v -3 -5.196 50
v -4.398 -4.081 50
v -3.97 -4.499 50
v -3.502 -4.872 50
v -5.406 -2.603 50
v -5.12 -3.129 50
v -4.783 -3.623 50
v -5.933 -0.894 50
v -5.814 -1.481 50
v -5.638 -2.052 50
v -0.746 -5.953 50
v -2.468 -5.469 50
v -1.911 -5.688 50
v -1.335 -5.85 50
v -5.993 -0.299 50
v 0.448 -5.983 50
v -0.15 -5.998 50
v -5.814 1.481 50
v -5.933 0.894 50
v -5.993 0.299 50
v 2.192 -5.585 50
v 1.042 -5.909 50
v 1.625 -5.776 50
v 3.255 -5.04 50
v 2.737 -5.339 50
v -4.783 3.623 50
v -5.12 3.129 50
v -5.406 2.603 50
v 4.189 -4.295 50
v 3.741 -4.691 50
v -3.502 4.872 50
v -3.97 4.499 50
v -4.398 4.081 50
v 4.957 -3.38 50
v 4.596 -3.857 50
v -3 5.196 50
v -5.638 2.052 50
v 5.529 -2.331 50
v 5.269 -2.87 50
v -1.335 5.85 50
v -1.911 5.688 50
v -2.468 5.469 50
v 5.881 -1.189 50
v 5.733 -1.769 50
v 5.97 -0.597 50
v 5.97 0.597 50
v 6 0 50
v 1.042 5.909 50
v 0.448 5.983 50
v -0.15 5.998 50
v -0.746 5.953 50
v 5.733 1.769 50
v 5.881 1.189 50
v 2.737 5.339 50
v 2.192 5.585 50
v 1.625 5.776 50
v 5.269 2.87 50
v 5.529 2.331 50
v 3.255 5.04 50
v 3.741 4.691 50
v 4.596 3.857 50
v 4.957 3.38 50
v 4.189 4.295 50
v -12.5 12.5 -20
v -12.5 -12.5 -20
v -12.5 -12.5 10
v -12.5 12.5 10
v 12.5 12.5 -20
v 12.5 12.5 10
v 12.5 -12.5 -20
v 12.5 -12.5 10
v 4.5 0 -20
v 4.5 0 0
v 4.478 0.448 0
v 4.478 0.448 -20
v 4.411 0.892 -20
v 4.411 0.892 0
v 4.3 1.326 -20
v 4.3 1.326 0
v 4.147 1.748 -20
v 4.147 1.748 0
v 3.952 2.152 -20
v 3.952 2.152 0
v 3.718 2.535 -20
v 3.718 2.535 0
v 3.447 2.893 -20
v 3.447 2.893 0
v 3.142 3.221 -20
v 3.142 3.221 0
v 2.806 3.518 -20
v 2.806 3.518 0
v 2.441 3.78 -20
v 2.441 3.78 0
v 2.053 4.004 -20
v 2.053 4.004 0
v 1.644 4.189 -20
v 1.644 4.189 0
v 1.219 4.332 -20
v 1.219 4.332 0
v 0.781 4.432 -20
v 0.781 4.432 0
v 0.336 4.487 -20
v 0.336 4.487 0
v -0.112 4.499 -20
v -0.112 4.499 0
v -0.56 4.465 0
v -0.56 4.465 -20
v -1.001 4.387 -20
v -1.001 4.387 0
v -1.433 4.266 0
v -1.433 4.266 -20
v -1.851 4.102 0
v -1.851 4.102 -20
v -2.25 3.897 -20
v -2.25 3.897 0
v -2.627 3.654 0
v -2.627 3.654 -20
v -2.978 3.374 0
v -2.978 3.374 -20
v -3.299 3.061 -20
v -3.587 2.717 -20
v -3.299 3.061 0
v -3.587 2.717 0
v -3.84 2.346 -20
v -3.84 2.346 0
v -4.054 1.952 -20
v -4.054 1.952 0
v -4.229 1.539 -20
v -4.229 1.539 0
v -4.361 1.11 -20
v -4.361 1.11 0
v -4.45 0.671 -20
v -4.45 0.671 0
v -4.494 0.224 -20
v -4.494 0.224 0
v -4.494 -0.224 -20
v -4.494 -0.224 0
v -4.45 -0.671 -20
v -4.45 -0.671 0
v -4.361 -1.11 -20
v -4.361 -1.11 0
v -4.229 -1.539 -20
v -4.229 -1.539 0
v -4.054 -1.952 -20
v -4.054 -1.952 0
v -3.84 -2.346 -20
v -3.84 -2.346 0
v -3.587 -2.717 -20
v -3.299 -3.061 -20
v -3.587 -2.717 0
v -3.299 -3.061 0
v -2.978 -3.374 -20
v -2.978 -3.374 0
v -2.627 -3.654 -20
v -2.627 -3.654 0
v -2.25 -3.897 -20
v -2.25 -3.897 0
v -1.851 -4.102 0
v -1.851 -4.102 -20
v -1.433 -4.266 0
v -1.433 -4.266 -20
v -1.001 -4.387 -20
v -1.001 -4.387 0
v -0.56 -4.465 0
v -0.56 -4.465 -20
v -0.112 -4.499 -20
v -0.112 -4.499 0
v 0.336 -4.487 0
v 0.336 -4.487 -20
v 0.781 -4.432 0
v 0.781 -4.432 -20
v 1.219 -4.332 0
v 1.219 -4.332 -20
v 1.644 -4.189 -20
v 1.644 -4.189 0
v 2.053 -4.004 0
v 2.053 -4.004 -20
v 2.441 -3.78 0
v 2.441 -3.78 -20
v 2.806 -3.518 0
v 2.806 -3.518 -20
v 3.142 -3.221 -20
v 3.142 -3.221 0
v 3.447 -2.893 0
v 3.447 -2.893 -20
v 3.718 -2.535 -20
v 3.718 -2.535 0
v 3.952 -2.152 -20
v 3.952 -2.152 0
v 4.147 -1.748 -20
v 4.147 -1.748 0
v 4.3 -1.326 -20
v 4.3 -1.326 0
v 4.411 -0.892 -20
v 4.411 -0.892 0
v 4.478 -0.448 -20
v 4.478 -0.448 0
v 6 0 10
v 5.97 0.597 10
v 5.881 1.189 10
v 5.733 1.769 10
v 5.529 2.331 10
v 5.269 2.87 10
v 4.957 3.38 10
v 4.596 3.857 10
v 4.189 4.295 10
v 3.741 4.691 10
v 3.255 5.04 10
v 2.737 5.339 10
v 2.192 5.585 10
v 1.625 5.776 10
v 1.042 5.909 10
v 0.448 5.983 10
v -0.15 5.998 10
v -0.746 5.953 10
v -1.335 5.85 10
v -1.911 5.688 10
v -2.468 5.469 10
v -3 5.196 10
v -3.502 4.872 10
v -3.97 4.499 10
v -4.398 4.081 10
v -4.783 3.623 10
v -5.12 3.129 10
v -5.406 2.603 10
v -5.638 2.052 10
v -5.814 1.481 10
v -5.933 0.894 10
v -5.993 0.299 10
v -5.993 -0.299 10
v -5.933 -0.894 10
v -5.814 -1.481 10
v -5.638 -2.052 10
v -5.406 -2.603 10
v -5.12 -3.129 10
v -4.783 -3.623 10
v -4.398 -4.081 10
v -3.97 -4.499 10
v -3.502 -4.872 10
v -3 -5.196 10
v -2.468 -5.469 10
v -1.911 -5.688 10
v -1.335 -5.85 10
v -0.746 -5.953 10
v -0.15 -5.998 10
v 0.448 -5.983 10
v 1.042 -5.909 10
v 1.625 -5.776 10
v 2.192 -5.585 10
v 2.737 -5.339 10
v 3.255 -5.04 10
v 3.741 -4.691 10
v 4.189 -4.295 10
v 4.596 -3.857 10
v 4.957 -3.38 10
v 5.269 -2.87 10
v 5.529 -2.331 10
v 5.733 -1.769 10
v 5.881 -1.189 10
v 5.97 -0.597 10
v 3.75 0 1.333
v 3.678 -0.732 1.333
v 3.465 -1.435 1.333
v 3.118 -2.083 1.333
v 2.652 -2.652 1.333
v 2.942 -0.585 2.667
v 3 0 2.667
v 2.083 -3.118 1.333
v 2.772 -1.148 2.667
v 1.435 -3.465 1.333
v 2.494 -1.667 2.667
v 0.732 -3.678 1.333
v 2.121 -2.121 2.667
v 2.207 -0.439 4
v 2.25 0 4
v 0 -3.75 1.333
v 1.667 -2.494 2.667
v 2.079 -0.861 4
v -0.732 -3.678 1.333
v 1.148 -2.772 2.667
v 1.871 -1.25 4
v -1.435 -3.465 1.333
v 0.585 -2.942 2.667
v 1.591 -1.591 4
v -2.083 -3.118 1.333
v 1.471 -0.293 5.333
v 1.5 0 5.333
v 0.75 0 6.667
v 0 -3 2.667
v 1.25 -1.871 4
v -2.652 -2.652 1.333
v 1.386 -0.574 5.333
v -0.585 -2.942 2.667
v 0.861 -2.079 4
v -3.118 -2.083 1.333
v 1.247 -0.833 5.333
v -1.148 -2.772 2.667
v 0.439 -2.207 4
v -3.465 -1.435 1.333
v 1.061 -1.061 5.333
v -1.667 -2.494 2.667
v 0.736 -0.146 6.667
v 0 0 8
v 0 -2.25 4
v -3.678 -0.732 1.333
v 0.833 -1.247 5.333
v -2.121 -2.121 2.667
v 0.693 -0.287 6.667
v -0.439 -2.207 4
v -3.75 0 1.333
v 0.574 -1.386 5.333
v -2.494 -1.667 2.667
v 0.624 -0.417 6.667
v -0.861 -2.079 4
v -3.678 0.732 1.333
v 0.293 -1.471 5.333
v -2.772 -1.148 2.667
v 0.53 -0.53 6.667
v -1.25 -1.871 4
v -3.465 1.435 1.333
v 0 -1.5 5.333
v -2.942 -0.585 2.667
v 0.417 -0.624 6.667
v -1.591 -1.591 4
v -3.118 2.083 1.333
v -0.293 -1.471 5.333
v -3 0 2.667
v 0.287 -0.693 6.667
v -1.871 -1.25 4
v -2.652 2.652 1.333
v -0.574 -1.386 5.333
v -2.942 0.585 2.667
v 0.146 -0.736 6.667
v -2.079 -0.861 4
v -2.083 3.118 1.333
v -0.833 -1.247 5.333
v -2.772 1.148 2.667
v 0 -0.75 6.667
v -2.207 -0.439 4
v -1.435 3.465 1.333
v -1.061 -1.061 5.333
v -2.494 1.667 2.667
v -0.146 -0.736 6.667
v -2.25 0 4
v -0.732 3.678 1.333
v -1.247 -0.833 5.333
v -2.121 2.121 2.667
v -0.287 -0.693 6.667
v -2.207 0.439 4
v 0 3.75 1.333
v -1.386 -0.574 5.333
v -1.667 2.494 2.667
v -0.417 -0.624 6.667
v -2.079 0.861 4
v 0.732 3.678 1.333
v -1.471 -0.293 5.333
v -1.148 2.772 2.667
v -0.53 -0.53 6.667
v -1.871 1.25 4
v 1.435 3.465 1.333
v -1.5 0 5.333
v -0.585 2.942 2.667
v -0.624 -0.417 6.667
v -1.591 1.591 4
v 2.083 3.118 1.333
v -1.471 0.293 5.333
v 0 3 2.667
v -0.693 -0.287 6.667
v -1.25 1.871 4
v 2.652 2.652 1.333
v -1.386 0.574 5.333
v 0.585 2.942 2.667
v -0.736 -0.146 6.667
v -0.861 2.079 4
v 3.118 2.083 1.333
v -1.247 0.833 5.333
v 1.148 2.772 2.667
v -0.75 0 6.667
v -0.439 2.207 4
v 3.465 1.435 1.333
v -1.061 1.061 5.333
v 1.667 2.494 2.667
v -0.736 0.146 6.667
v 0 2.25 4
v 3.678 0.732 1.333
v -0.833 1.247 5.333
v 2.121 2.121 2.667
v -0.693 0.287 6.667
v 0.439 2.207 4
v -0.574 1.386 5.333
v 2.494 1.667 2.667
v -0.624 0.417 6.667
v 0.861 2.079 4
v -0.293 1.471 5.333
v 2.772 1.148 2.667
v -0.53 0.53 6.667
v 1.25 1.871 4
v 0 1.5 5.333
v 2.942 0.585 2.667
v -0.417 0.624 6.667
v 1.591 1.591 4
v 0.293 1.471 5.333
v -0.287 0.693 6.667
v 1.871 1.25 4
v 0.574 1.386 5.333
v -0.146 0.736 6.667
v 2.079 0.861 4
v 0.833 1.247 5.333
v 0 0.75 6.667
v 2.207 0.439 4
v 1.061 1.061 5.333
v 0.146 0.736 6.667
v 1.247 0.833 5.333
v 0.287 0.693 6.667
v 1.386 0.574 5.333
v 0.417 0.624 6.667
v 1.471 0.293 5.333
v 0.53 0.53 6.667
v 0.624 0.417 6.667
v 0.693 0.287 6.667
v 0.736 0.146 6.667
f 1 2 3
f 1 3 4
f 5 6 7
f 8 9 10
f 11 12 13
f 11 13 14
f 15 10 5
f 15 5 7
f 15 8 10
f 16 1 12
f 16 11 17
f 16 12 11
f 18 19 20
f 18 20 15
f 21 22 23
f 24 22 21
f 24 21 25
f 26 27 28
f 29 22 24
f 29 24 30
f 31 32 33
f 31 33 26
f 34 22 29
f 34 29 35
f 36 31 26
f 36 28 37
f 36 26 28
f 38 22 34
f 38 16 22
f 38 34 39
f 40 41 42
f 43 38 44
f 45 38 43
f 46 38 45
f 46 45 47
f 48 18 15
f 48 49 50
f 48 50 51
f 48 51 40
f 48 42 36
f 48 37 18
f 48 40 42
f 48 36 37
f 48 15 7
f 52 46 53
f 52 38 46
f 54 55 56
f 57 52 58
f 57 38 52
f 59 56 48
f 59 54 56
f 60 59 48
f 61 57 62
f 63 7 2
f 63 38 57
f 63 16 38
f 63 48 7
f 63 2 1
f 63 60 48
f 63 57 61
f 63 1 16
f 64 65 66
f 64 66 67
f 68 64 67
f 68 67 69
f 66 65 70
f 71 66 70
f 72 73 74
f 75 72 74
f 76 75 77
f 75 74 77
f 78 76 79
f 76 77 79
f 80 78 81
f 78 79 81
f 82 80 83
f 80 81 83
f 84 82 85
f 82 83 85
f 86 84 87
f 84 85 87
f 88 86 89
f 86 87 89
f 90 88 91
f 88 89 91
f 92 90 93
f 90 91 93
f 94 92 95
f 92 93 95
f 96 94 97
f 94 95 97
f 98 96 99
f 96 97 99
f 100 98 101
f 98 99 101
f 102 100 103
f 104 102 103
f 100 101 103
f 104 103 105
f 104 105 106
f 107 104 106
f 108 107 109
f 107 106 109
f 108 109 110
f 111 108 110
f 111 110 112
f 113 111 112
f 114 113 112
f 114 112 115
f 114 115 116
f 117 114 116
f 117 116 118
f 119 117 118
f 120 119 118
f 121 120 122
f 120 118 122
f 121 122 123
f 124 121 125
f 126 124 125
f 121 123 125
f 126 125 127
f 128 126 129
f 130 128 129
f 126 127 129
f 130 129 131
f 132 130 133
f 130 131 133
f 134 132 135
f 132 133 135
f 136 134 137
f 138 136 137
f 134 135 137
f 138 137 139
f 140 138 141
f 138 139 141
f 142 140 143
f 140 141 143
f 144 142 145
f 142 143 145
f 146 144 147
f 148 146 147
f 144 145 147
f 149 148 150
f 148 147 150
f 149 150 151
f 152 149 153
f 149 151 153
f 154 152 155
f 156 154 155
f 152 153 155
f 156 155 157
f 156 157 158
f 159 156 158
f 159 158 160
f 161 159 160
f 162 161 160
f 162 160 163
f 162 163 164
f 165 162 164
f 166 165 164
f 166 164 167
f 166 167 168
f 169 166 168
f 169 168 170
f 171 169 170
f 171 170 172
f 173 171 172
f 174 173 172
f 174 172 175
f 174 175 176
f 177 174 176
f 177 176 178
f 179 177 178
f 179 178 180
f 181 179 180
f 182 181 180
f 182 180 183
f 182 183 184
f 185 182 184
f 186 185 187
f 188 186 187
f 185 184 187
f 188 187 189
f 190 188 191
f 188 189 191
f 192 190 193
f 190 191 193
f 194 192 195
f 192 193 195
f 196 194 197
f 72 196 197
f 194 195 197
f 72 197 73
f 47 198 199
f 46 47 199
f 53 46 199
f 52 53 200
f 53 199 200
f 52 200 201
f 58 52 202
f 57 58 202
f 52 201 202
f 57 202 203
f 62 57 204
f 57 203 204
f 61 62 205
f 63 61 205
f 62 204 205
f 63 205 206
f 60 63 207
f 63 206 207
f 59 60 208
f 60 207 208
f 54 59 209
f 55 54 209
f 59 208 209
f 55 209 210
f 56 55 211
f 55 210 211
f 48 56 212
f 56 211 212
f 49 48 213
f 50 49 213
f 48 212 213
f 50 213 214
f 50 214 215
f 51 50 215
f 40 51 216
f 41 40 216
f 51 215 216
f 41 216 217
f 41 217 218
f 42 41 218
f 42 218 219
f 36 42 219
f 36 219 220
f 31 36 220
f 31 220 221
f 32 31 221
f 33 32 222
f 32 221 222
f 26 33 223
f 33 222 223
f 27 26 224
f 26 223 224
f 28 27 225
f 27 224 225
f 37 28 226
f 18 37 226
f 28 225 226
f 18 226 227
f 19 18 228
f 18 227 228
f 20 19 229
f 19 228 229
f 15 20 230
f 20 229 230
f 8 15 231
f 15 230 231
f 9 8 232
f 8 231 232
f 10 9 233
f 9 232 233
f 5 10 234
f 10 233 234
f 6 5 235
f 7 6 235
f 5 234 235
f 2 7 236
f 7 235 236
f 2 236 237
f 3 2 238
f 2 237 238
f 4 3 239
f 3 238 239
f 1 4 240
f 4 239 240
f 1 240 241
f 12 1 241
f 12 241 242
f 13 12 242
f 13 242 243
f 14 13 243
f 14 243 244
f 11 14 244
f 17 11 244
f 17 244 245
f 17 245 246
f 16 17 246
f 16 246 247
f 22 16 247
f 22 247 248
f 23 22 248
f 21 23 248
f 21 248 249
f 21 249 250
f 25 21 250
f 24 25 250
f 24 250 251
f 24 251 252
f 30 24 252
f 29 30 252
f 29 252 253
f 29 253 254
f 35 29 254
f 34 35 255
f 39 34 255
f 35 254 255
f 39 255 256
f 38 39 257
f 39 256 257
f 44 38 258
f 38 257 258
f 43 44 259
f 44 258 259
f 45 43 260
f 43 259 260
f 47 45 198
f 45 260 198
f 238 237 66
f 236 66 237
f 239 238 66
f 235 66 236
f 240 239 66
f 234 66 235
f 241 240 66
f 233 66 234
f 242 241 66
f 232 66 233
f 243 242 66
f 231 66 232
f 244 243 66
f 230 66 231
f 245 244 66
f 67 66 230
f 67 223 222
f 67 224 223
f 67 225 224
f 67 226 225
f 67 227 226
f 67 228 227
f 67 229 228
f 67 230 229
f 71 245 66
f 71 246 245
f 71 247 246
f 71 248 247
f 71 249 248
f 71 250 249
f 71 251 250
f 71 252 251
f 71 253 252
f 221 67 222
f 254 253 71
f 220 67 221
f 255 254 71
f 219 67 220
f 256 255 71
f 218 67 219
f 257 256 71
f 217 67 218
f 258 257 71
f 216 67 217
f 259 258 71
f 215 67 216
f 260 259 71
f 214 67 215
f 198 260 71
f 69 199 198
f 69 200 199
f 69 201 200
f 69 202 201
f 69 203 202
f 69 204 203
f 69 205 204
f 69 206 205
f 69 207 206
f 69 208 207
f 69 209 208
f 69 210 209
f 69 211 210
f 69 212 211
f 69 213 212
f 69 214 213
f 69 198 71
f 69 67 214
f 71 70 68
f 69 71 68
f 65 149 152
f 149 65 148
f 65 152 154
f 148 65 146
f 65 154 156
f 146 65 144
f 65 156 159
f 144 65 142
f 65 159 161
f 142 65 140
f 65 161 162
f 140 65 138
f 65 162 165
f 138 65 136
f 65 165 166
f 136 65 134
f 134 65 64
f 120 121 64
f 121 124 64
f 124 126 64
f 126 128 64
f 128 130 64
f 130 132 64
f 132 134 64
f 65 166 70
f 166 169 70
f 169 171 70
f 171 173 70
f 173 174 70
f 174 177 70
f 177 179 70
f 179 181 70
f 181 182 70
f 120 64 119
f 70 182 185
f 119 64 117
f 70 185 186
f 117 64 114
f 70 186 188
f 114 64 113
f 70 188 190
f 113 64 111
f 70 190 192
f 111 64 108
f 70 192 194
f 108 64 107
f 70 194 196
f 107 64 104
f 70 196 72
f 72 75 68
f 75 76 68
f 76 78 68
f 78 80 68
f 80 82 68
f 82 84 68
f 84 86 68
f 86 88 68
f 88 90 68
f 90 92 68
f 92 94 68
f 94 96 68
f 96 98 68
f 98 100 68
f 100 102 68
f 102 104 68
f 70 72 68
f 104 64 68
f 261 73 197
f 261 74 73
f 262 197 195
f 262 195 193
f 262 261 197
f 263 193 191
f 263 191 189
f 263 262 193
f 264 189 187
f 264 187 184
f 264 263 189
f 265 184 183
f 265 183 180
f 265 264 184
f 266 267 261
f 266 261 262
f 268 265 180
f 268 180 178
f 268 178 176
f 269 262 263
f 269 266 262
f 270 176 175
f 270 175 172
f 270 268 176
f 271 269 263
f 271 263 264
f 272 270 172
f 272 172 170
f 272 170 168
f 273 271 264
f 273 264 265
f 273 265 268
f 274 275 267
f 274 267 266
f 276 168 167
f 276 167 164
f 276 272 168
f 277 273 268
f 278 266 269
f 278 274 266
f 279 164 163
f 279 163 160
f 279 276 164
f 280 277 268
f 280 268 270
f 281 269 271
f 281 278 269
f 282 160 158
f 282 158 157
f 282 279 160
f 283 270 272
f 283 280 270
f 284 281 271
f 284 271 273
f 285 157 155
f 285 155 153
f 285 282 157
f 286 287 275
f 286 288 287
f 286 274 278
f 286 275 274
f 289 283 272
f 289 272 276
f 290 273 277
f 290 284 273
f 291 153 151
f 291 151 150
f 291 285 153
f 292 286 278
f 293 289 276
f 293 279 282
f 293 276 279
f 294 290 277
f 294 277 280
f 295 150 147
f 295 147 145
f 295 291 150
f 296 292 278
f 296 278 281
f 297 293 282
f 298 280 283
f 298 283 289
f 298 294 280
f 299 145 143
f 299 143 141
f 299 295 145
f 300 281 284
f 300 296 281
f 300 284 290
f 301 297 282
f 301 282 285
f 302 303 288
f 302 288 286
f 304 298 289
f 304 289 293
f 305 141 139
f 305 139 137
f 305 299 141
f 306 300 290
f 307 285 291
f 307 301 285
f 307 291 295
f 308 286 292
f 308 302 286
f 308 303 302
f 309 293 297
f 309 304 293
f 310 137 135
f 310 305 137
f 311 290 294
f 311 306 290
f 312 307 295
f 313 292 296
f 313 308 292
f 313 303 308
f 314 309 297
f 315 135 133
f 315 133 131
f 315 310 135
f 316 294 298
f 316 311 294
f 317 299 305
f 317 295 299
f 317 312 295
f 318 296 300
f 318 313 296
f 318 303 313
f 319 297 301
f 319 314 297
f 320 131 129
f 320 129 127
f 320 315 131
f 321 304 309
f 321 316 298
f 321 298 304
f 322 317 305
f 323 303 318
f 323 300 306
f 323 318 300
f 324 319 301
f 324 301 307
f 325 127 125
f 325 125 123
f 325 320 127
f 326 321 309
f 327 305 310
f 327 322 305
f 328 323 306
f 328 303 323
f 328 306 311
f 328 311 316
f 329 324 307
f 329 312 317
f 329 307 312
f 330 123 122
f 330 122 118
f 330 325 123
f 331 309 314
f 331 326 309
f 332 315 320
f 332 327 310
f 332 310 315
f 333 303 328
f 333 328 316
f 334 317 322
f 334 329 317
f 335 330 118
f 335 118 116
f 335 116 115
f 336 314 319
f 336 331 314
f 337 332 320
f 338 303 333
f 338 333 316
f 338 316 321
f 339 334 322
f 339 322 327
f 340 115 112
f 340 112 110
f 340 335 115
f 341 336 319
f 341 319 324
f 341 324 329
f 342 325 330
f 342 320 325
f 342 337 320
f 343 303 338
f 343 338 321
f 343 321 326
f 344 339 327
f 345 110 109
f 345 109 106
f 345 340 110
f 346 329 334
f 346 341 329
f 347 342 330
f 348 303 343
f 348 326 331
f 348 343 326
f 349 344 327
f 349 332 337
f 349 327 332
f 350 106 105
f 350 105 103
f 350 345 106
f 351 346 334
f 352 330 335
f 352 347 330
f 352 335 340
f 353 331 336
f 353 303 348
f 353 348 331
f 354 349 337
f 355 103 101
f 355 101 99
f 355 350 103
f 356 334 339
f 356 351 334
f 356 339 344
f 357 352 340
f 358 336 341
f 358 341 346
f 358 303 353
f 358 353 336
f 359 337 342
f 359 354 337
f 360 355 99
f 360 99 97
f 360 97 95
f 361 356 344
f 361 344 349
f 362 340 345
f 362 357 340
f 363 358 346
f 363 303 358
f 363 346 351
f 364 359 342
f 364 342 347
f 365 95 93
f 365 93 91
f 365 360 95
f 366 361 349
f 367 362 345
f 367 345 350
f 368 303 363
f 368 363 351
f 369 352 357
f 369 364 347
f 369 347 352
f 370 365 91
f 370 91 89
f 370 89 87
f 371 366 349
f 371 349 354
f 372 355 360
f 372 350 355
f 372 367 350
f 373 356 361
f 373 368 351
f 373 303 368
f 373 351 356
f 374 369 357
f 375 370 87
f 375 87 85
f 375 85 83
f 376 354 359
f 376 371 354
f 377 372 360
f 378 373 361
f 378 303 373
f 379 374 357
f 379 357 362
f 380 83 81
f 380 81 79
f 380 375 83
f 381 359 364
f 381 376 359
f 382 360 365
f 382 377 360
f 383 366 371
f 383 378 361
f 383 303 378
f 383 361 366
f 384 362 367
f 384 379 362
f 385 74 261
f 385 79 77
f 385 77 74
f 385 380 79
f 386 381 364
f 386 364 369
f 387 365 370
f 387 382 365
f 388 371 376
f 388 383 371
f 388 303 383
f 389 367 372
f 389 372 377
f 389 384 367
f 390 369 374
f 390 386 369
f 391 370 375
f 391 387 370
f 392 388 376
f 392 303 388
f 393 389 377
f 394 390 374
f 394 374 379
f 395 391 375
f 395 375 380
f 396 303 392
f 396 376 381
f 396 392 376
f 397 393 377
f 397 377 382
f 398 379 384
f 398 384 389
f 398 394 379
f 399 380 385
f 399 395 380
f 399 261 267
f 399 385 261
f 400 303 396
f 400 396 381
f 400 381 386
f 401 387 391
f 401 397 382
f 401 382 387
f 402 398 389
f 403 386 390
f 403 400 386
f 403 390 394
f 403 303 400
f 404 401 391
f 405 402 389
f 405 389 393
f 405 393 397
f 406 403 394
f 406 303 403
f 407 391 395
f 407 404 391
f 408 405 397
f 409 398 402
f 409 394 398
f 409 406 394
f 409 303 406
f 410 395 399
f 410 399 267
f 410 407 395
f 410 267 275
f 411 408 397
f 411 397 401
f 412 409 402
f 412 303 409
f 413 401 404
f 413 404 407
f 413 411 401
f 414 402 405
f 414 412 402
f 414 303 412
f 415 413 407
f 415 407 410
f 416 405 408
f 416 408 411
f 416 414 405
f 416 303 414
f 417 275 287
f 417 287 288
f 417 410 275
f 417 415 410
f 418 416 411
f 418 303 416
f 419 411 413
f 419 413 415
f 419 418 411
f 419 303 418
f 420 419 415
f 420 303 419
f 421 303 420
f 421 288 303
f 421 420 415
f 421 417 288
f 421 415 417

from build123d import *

# Parameters (mm, degrees)
F0_W     = 25
F0_H     = 25
F1_DEPTH = 10
F4_W     = 25
F4_H     = 25
F4_R     = 4.5
F5_DEPTH = 20
F6_R     = 6
F7_DEPTH = 40


with BuildPart() as f1:
    # F0 (on Top) → F1 (new body)
    with BuildSketch(Plane.XY):
        Rectangle(F0_W, F0_H)
    extrude(amount=F1_DEPTH)

    # F2 (on Front) → F3 (revolve, cut)
    with BuildSketch(Plane.XZ):
        Polygon((4.5, 0), (0, 8), (0, 0), align=None)
    revolve(axis=Axis((0, 0, 4), (0, 0, -1)), mode=Mode.SUBTRACT)

    # F4 (on Top) → F5 (join)
    with BuildSketch(Plane.XY):
        Rectangle(F4_W, F4_H)
        Circle(F4_R, mode=Mode.SUBTRACT)
    extrude(amount=-F5_DEPTH)

    # F6 (on face) → F7 (join)
    with BuildSketch(Plane.XY.offset(10)):
        Circle(F6_R)
    extrude(amount=F7_DEPTH)


solid = f1.part
